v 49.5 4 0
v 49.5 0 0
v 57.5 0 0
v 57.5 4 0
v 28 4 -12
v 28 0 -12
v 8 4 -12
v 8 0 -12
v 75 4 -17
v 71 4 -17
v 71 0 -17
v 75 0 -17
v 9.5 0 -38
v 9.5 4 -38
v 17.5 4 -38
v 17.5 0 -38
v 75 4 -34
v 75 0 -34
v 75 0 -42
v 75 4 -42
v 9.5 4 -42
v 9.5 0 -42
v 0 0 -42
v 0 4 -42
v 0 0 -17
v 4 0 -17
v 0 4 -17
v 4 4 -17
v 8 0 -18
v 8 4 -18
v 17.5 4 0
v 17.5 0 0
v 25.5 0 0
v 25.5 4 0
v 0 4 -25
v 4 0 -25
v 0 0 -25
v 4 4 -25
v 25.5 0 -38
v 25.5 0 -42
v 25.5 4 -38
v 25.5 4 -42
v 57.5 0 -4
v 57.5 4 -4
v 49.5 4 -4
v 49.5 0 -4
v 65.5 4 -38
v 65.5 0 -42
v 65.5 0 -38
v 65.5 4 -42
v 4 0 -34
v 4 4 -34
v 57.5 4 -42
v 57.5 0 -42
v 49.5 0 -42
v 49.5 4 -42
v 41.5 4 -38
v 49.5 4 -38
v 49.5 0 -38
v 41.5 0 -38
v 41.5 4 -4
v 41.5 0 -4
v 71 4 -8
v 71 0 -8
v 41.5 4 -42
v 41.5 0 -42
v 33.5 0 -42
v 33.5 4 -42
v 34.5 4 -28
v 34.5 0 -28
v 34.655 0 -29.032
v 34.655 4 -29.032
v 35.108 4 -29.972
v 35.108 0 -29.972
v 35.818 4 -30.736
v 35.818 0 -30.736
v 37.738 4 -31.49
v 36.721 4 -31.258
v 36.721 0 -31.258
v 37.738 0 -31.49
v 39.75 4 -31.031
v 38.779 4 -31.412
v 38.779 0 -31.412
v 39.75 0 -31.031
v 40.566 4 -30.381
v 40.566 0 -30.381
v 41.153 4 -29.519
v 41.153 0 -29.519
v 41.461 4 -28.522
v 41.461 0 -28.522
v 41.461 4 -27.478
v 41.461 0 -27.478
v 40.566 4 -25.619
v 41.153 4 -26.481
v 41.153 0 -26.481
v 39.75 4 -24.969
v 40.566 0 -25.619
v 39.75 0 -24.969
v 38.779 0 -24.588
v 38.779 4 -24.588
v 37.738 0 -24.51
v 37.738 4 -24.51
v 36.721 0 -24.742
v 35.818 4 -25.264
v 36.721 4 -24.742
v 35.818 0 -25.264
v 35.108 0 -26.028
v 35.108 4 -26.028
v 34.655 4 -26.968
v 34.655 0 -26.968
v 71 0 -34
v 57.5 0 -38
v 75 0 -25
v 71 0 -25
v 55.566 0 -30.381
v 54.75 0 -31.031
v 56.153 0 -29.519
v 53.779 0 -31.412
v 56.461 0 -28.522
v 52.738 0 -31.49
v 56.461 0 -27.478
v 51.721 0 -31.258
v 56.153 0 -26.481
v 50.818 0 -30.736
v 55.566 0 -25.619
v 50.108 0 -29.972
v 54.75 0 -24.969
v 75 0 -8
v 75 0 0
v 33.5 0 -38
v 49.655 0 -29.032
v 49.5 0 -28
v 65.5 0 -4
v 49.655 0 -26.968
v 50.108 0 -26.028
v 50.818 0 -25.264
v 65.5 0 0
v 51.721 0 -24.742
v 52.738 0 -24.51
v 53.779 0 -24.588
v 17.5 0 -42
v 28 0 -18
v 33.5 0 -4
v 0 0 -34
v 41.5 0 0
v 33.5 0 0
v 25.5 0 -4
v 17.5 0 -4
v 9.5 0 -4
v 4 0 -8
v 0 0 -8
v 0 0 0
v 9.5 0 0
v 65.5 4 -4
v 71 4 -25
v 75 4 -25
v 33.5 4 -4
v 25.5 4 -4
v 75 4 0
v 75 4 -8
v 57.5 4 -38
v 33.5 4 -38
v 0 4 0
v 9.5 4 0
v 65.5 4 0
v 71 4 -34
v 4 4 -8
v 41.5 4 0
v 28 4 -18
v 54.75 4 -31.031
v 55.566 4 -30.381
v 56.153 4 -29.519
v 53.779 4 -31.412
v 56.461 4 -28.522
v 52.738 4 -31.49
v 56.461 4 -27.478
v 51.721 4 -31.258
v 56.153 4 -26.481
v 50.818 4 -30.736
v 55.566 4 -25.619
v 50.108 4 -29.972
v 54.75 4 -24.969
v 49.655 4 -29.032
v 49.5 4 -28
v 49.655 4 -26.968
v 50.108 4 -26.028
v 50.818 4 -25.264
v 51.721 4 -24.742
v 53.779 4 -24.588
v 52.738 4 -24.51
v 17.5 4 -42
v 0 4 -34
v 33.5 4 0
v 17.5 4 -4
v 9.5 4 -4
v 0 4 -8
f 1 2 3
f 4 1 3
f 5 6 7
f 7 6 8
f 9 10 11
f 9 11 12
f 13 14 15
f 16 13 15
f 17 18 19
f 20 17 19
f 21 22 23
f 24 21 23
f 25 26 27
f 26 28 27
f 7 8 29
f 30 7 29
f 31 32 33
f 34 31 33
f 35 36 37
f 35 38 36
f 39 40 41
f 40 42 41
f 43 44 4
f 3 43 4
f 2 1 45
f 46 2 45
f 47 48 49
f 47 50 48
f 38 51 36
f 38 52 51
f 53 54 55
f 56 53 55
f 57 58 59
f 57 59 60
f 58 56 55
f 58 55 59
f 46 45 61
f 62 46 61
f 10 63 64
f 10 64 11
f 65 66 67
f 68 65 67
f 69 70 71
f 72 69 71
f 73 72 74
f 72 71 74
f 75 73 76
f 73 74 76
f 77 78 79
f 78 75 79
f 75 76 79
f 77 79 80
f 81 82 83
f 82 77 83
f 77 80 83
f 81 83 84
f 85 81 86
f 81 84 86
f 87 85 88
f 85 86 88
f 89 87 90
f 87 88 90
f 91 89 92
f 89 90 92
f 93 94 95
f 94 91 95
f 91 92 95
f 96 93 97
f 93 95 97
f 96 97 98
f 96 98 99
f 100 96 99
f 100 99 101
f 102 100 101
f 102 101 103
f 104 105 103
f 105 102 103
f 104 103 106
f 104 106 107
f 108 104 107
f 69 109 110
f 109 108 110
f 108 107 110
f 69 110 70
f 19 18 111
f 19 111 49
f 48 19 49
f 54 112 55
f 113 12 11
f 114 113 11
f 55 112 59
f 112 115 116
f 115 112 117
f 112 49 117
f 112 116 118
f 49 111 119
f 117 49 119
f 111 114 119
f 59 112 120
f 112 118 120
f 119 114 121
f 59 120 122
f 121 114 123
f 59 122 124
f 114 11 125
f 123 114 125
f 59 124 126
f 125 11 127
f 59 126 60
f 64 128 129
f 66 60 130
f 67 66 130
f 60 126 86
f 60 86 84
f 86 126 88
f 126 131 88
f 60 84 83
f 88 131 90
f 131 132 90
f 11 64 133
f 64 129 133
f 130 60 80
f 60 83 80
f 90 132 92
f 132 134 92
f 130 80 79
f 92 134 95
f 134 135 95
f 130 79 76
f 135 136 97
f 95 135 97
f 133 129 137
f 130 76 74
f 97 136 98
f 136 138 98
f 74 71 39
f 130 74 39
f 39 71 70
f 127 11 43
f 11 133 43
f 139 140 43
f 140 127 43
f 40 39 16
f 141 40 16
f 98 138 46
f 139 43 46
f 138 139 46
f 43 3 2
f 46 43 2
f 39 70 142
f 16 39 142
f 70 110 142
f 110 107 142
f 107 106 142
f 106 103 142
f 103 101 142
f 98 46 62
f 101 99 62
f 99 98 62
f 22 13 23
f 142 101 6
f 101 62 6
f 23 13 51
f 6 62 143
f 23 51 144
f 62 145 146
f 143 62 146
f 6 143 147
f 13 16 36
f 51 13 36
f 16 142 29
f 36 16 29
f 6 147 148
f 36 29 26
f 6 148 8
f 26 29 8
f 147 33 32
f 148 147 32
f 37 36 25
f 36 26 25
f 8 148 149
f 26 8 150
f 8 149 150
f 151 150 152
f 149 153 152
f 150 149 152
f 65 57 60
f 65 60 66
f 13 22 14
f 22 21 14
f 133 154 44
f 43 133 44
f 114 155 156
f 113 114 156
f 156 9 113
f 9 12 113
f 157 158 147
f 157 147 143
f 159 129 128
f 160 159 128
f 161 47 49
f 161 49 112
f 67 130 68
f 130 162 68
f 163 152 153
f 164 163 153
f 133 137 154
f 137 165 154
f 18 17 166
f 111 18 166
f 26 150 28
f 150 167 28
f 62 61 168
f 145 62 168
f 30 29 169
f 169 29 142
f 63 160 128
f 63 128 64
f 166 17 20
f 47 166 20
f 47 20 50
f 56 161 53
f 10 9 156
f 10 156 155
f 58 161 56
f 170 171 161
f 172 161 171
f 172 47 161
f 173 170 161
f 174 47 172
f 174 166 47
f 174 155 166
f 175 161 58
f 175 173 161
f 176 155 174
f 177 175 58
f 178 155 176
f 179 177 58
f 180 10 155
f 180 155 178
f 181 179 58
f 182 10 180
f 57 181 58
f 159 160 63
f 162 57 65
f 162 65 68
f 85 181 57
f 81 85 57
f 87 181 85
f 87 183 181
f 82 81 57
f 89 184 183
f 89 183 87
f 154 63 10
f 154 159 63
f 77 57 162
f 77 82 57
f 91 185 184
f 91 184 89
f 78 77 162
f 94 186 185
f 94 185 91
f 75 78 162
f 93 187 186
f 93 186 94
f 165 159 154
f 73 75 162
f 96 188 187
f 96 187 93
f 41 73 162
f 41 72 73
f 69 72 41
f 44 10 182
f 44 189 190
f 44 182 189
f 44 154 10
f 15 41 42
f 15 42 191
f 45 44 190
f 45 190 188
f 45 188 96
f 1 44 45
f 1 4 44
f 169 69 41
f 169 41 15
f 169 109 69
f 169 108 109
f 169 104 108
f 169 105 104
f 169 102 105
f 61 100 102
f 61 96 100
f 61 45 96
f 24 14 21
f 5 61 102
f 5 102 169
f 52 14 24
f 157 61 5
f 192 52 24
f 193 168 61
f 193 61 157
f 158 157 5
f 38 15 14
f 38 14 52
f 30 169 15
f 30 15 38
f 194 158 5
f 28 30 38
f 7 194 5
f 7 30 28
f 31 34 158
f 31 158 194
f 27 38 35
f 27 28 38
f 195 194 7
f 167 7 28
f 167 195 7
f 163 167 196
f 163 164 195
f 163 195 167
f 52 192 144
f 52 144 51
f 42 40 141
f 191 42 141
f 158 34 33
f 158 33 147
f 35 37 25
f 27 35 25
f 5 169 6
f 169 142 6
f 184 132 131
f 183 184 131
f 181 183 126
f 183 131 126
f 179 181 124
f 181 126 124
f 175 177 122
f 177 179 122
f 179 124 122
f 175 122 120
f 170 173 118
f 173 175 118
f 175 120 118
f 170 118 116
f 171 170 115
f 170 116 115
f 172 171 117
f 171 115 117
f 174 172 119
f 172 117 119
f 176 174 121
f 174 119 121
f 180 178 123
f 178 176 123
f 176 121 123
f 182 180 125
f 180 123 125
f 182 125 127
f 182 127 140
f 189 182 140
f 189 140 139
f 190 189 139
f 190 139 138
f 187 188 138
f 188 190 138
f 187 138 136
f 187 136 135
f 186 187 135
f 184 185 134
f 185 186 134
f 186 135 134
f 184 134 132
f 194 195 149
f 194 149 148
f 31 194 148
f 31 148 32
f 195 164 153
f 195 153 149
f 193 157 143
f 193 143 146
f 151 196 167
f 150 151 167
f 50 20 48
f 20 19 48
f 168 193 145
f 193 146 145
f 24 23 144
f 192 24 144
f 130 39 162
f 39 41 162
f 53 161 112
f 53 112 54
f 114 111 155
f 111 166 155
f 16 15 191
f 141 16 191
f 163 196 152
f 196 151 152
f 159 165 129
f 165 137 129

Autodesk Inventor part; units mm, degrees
ref_plane "YZ Plane" through (0, 0, 0) normal (1, 0, 0) x (0, 1, 0)
ref_plane "XZ Plane" through (0, 0, 0) normal (0, 1, 0) x (-1, 0, 0)
ref_plane "XY Plane" through (0, 0, 0) normal (0, 0, 1) x (1, 0, 0)
sketch "Sketch1" plane through (0, 0, 0) normal (0, 1, 0) x (-1, 0, 0)
  line L0 (0, 0) -> (-75, 0)
  line L1 (-75, 0) -> (-75, -42)
  line L2 (-75, -42) -> (0, -42)
  line L3 (0, -42) -> (0, 0)
  line L4 (-8, -18) -> (-28, -18)
  line L5 (-28, -18) -> (-28, -12)
  line L6 (-28, -12) -> (-8, -12)
  line L7 (-8, -12) -> (-8, -18)
  circle A0 centre (-38, -28) radius 3.5
  circle A1 centre (-53, -28) radius 3.5
  dimension "d0" = 75
  dimension "d1" = 42
  dimension "d2" = 20
  dimension "d3" = 6
  dimension "d4" = 12
  dimension "d5" = 8
  dimension "d6" = 7
  dimension "d7" = 28
  dimension "d8" = 38
  dimension "d9" = 15
extrude "Extrusion1" add sketch "Sketch1" along normal blind 4
sketch "Sketch2" plane through (0, 4, 0) normal (0, 1, 0) x (1, 0, 0)
  line L0 (0, 42) -> (0, 0) construction
  line L1 (75, 42) -> (0, 42) construction
  line L2 (75, 0) -> (75, 42) construction
  line L3 (0, 0) -> (75, 0) construction
  line L4 (4, 38) -> (4, 4) construction
  line L5 (4, 4) -> (71, 4) construction
  line L6 (71, 4) -> (71, 38) construction
  line L7 (71, 38) -> (4, 38) construction
  line L8 (0, 42) -> (0, 0) construction
  line L9 (0, 21) -> (75, 21) construction
  line L10 (37.5, 42) -> (37.5, 0) construction
  line L11 (0, 34) -> (4, 34)
  line L12 (4, 34) -> (4, 25)
  line L13 (4, 25) -> (0, 25)
  line L14 (0, 25) -> (0, 34)
  line L15 (75, 42) -> (0, 42) projected
  line L16 (9.5, 38) -> (17.5, 38)
  line L17 (17.5, 38) -> (17.5, 42)
  line L18 (17.5, 42) -> (9.5, 42)
  line L19 (9.5, 42) -> (9.5, 38)
  line L20 (25.5, 38) -> (33.5, 38)
  line L21 (33.5, 38) -> (33.5, 42)
  line L22 (33.5, 42) -> (25.5, 42)
  line L23 (25.5, 42) -> (25.5, 38)
  line L24 (75, 34) -> (71, 34)
  line L25 (71, 34) -> (71, 25)
  line L26 (71, 25) -> (75, 25)
  line L27 (75, 25) -> (75, 34)
  line L28 (65.5, 38) -> (57.5, 38)
  line L29 (57.5, 38) -> (57.5, 42)
  line L30 (57.5, 42) -> (65.5, 42)
  line L31 (65.5, 42) -> (65.5, 38)
  line L32 (49.5, 38) -> (41.5, 38)
  line L33 (41.5, 38) -> (41.5, 42)
  line L34 (41.5, 42) -> (49.5, 42)
  line L35 (49.5, 42) -> (49.5, 38)
  line L36 (75, 0) -> (0, 0) construction
  line L37 (71, 4) -> (4, 4) construction
  line L38 (0, 8) -> (4, 8)
  line L39 (4, 8) -> (4, 17)
  line L40 (4, 17) -> (0, 17)
  line L41 (0, 17) -> (0, 8)
  line L42 (75, 0) -> (0, 0)
  line L43 (9.5, 4) -> (17.5, 4)
  line L44 (17.5, 4) -> (17.5, 0)
  line L45 (17.5, 0) -> (9.5, 0)
  line L46 (9.5, 0) -> (9.5, 4)
  line L47 (25.5, 4) -> (33.5, 4)
  line L48 (33.5, 4) -> (33.5, 0)
  line L49 (33.5, 0) -> (25.5, 0)
  line L50 (25.5, 0) -> (25.5, 4)
  line L51 (49.5, 4) -> (41.5, 4)
  line L52 (49.5, 0) -> (49.5, 4)
  line L53 (41.5, 0) -> (49.5, 0)
  line L54 (41.5, 4) -> (41.5, 0)
  line L55 (57.5, 4) -> (57.5, 0)
  line L56 (65.5, 4) -> (57.5, 4)
  line L57 (57.5, 0) -> (65.5, 0)
  line L58 (71, 8) -> (71, 17)
  line L59 (71, 17) -> (75, 17)
  line L60 (75, 17) -> (75, 8)
  line L61 (75, 8) -> (71, 8)
  line L62 (65.5, 0) -> (65.5, 4)
  dimension "d12" = 4
  dimension "d13" = 4
  dimension "d14" = 8
  dimension "d15" = 8
  dimension "d16" = 8
  dimension "d17" = 8
  dimension "d18" = 4
extrude "Extrusion2" cut sketch "Sketch2" against normal up to surface (4 mm away)
properties part number "left" material "PBT Plastic Black"
